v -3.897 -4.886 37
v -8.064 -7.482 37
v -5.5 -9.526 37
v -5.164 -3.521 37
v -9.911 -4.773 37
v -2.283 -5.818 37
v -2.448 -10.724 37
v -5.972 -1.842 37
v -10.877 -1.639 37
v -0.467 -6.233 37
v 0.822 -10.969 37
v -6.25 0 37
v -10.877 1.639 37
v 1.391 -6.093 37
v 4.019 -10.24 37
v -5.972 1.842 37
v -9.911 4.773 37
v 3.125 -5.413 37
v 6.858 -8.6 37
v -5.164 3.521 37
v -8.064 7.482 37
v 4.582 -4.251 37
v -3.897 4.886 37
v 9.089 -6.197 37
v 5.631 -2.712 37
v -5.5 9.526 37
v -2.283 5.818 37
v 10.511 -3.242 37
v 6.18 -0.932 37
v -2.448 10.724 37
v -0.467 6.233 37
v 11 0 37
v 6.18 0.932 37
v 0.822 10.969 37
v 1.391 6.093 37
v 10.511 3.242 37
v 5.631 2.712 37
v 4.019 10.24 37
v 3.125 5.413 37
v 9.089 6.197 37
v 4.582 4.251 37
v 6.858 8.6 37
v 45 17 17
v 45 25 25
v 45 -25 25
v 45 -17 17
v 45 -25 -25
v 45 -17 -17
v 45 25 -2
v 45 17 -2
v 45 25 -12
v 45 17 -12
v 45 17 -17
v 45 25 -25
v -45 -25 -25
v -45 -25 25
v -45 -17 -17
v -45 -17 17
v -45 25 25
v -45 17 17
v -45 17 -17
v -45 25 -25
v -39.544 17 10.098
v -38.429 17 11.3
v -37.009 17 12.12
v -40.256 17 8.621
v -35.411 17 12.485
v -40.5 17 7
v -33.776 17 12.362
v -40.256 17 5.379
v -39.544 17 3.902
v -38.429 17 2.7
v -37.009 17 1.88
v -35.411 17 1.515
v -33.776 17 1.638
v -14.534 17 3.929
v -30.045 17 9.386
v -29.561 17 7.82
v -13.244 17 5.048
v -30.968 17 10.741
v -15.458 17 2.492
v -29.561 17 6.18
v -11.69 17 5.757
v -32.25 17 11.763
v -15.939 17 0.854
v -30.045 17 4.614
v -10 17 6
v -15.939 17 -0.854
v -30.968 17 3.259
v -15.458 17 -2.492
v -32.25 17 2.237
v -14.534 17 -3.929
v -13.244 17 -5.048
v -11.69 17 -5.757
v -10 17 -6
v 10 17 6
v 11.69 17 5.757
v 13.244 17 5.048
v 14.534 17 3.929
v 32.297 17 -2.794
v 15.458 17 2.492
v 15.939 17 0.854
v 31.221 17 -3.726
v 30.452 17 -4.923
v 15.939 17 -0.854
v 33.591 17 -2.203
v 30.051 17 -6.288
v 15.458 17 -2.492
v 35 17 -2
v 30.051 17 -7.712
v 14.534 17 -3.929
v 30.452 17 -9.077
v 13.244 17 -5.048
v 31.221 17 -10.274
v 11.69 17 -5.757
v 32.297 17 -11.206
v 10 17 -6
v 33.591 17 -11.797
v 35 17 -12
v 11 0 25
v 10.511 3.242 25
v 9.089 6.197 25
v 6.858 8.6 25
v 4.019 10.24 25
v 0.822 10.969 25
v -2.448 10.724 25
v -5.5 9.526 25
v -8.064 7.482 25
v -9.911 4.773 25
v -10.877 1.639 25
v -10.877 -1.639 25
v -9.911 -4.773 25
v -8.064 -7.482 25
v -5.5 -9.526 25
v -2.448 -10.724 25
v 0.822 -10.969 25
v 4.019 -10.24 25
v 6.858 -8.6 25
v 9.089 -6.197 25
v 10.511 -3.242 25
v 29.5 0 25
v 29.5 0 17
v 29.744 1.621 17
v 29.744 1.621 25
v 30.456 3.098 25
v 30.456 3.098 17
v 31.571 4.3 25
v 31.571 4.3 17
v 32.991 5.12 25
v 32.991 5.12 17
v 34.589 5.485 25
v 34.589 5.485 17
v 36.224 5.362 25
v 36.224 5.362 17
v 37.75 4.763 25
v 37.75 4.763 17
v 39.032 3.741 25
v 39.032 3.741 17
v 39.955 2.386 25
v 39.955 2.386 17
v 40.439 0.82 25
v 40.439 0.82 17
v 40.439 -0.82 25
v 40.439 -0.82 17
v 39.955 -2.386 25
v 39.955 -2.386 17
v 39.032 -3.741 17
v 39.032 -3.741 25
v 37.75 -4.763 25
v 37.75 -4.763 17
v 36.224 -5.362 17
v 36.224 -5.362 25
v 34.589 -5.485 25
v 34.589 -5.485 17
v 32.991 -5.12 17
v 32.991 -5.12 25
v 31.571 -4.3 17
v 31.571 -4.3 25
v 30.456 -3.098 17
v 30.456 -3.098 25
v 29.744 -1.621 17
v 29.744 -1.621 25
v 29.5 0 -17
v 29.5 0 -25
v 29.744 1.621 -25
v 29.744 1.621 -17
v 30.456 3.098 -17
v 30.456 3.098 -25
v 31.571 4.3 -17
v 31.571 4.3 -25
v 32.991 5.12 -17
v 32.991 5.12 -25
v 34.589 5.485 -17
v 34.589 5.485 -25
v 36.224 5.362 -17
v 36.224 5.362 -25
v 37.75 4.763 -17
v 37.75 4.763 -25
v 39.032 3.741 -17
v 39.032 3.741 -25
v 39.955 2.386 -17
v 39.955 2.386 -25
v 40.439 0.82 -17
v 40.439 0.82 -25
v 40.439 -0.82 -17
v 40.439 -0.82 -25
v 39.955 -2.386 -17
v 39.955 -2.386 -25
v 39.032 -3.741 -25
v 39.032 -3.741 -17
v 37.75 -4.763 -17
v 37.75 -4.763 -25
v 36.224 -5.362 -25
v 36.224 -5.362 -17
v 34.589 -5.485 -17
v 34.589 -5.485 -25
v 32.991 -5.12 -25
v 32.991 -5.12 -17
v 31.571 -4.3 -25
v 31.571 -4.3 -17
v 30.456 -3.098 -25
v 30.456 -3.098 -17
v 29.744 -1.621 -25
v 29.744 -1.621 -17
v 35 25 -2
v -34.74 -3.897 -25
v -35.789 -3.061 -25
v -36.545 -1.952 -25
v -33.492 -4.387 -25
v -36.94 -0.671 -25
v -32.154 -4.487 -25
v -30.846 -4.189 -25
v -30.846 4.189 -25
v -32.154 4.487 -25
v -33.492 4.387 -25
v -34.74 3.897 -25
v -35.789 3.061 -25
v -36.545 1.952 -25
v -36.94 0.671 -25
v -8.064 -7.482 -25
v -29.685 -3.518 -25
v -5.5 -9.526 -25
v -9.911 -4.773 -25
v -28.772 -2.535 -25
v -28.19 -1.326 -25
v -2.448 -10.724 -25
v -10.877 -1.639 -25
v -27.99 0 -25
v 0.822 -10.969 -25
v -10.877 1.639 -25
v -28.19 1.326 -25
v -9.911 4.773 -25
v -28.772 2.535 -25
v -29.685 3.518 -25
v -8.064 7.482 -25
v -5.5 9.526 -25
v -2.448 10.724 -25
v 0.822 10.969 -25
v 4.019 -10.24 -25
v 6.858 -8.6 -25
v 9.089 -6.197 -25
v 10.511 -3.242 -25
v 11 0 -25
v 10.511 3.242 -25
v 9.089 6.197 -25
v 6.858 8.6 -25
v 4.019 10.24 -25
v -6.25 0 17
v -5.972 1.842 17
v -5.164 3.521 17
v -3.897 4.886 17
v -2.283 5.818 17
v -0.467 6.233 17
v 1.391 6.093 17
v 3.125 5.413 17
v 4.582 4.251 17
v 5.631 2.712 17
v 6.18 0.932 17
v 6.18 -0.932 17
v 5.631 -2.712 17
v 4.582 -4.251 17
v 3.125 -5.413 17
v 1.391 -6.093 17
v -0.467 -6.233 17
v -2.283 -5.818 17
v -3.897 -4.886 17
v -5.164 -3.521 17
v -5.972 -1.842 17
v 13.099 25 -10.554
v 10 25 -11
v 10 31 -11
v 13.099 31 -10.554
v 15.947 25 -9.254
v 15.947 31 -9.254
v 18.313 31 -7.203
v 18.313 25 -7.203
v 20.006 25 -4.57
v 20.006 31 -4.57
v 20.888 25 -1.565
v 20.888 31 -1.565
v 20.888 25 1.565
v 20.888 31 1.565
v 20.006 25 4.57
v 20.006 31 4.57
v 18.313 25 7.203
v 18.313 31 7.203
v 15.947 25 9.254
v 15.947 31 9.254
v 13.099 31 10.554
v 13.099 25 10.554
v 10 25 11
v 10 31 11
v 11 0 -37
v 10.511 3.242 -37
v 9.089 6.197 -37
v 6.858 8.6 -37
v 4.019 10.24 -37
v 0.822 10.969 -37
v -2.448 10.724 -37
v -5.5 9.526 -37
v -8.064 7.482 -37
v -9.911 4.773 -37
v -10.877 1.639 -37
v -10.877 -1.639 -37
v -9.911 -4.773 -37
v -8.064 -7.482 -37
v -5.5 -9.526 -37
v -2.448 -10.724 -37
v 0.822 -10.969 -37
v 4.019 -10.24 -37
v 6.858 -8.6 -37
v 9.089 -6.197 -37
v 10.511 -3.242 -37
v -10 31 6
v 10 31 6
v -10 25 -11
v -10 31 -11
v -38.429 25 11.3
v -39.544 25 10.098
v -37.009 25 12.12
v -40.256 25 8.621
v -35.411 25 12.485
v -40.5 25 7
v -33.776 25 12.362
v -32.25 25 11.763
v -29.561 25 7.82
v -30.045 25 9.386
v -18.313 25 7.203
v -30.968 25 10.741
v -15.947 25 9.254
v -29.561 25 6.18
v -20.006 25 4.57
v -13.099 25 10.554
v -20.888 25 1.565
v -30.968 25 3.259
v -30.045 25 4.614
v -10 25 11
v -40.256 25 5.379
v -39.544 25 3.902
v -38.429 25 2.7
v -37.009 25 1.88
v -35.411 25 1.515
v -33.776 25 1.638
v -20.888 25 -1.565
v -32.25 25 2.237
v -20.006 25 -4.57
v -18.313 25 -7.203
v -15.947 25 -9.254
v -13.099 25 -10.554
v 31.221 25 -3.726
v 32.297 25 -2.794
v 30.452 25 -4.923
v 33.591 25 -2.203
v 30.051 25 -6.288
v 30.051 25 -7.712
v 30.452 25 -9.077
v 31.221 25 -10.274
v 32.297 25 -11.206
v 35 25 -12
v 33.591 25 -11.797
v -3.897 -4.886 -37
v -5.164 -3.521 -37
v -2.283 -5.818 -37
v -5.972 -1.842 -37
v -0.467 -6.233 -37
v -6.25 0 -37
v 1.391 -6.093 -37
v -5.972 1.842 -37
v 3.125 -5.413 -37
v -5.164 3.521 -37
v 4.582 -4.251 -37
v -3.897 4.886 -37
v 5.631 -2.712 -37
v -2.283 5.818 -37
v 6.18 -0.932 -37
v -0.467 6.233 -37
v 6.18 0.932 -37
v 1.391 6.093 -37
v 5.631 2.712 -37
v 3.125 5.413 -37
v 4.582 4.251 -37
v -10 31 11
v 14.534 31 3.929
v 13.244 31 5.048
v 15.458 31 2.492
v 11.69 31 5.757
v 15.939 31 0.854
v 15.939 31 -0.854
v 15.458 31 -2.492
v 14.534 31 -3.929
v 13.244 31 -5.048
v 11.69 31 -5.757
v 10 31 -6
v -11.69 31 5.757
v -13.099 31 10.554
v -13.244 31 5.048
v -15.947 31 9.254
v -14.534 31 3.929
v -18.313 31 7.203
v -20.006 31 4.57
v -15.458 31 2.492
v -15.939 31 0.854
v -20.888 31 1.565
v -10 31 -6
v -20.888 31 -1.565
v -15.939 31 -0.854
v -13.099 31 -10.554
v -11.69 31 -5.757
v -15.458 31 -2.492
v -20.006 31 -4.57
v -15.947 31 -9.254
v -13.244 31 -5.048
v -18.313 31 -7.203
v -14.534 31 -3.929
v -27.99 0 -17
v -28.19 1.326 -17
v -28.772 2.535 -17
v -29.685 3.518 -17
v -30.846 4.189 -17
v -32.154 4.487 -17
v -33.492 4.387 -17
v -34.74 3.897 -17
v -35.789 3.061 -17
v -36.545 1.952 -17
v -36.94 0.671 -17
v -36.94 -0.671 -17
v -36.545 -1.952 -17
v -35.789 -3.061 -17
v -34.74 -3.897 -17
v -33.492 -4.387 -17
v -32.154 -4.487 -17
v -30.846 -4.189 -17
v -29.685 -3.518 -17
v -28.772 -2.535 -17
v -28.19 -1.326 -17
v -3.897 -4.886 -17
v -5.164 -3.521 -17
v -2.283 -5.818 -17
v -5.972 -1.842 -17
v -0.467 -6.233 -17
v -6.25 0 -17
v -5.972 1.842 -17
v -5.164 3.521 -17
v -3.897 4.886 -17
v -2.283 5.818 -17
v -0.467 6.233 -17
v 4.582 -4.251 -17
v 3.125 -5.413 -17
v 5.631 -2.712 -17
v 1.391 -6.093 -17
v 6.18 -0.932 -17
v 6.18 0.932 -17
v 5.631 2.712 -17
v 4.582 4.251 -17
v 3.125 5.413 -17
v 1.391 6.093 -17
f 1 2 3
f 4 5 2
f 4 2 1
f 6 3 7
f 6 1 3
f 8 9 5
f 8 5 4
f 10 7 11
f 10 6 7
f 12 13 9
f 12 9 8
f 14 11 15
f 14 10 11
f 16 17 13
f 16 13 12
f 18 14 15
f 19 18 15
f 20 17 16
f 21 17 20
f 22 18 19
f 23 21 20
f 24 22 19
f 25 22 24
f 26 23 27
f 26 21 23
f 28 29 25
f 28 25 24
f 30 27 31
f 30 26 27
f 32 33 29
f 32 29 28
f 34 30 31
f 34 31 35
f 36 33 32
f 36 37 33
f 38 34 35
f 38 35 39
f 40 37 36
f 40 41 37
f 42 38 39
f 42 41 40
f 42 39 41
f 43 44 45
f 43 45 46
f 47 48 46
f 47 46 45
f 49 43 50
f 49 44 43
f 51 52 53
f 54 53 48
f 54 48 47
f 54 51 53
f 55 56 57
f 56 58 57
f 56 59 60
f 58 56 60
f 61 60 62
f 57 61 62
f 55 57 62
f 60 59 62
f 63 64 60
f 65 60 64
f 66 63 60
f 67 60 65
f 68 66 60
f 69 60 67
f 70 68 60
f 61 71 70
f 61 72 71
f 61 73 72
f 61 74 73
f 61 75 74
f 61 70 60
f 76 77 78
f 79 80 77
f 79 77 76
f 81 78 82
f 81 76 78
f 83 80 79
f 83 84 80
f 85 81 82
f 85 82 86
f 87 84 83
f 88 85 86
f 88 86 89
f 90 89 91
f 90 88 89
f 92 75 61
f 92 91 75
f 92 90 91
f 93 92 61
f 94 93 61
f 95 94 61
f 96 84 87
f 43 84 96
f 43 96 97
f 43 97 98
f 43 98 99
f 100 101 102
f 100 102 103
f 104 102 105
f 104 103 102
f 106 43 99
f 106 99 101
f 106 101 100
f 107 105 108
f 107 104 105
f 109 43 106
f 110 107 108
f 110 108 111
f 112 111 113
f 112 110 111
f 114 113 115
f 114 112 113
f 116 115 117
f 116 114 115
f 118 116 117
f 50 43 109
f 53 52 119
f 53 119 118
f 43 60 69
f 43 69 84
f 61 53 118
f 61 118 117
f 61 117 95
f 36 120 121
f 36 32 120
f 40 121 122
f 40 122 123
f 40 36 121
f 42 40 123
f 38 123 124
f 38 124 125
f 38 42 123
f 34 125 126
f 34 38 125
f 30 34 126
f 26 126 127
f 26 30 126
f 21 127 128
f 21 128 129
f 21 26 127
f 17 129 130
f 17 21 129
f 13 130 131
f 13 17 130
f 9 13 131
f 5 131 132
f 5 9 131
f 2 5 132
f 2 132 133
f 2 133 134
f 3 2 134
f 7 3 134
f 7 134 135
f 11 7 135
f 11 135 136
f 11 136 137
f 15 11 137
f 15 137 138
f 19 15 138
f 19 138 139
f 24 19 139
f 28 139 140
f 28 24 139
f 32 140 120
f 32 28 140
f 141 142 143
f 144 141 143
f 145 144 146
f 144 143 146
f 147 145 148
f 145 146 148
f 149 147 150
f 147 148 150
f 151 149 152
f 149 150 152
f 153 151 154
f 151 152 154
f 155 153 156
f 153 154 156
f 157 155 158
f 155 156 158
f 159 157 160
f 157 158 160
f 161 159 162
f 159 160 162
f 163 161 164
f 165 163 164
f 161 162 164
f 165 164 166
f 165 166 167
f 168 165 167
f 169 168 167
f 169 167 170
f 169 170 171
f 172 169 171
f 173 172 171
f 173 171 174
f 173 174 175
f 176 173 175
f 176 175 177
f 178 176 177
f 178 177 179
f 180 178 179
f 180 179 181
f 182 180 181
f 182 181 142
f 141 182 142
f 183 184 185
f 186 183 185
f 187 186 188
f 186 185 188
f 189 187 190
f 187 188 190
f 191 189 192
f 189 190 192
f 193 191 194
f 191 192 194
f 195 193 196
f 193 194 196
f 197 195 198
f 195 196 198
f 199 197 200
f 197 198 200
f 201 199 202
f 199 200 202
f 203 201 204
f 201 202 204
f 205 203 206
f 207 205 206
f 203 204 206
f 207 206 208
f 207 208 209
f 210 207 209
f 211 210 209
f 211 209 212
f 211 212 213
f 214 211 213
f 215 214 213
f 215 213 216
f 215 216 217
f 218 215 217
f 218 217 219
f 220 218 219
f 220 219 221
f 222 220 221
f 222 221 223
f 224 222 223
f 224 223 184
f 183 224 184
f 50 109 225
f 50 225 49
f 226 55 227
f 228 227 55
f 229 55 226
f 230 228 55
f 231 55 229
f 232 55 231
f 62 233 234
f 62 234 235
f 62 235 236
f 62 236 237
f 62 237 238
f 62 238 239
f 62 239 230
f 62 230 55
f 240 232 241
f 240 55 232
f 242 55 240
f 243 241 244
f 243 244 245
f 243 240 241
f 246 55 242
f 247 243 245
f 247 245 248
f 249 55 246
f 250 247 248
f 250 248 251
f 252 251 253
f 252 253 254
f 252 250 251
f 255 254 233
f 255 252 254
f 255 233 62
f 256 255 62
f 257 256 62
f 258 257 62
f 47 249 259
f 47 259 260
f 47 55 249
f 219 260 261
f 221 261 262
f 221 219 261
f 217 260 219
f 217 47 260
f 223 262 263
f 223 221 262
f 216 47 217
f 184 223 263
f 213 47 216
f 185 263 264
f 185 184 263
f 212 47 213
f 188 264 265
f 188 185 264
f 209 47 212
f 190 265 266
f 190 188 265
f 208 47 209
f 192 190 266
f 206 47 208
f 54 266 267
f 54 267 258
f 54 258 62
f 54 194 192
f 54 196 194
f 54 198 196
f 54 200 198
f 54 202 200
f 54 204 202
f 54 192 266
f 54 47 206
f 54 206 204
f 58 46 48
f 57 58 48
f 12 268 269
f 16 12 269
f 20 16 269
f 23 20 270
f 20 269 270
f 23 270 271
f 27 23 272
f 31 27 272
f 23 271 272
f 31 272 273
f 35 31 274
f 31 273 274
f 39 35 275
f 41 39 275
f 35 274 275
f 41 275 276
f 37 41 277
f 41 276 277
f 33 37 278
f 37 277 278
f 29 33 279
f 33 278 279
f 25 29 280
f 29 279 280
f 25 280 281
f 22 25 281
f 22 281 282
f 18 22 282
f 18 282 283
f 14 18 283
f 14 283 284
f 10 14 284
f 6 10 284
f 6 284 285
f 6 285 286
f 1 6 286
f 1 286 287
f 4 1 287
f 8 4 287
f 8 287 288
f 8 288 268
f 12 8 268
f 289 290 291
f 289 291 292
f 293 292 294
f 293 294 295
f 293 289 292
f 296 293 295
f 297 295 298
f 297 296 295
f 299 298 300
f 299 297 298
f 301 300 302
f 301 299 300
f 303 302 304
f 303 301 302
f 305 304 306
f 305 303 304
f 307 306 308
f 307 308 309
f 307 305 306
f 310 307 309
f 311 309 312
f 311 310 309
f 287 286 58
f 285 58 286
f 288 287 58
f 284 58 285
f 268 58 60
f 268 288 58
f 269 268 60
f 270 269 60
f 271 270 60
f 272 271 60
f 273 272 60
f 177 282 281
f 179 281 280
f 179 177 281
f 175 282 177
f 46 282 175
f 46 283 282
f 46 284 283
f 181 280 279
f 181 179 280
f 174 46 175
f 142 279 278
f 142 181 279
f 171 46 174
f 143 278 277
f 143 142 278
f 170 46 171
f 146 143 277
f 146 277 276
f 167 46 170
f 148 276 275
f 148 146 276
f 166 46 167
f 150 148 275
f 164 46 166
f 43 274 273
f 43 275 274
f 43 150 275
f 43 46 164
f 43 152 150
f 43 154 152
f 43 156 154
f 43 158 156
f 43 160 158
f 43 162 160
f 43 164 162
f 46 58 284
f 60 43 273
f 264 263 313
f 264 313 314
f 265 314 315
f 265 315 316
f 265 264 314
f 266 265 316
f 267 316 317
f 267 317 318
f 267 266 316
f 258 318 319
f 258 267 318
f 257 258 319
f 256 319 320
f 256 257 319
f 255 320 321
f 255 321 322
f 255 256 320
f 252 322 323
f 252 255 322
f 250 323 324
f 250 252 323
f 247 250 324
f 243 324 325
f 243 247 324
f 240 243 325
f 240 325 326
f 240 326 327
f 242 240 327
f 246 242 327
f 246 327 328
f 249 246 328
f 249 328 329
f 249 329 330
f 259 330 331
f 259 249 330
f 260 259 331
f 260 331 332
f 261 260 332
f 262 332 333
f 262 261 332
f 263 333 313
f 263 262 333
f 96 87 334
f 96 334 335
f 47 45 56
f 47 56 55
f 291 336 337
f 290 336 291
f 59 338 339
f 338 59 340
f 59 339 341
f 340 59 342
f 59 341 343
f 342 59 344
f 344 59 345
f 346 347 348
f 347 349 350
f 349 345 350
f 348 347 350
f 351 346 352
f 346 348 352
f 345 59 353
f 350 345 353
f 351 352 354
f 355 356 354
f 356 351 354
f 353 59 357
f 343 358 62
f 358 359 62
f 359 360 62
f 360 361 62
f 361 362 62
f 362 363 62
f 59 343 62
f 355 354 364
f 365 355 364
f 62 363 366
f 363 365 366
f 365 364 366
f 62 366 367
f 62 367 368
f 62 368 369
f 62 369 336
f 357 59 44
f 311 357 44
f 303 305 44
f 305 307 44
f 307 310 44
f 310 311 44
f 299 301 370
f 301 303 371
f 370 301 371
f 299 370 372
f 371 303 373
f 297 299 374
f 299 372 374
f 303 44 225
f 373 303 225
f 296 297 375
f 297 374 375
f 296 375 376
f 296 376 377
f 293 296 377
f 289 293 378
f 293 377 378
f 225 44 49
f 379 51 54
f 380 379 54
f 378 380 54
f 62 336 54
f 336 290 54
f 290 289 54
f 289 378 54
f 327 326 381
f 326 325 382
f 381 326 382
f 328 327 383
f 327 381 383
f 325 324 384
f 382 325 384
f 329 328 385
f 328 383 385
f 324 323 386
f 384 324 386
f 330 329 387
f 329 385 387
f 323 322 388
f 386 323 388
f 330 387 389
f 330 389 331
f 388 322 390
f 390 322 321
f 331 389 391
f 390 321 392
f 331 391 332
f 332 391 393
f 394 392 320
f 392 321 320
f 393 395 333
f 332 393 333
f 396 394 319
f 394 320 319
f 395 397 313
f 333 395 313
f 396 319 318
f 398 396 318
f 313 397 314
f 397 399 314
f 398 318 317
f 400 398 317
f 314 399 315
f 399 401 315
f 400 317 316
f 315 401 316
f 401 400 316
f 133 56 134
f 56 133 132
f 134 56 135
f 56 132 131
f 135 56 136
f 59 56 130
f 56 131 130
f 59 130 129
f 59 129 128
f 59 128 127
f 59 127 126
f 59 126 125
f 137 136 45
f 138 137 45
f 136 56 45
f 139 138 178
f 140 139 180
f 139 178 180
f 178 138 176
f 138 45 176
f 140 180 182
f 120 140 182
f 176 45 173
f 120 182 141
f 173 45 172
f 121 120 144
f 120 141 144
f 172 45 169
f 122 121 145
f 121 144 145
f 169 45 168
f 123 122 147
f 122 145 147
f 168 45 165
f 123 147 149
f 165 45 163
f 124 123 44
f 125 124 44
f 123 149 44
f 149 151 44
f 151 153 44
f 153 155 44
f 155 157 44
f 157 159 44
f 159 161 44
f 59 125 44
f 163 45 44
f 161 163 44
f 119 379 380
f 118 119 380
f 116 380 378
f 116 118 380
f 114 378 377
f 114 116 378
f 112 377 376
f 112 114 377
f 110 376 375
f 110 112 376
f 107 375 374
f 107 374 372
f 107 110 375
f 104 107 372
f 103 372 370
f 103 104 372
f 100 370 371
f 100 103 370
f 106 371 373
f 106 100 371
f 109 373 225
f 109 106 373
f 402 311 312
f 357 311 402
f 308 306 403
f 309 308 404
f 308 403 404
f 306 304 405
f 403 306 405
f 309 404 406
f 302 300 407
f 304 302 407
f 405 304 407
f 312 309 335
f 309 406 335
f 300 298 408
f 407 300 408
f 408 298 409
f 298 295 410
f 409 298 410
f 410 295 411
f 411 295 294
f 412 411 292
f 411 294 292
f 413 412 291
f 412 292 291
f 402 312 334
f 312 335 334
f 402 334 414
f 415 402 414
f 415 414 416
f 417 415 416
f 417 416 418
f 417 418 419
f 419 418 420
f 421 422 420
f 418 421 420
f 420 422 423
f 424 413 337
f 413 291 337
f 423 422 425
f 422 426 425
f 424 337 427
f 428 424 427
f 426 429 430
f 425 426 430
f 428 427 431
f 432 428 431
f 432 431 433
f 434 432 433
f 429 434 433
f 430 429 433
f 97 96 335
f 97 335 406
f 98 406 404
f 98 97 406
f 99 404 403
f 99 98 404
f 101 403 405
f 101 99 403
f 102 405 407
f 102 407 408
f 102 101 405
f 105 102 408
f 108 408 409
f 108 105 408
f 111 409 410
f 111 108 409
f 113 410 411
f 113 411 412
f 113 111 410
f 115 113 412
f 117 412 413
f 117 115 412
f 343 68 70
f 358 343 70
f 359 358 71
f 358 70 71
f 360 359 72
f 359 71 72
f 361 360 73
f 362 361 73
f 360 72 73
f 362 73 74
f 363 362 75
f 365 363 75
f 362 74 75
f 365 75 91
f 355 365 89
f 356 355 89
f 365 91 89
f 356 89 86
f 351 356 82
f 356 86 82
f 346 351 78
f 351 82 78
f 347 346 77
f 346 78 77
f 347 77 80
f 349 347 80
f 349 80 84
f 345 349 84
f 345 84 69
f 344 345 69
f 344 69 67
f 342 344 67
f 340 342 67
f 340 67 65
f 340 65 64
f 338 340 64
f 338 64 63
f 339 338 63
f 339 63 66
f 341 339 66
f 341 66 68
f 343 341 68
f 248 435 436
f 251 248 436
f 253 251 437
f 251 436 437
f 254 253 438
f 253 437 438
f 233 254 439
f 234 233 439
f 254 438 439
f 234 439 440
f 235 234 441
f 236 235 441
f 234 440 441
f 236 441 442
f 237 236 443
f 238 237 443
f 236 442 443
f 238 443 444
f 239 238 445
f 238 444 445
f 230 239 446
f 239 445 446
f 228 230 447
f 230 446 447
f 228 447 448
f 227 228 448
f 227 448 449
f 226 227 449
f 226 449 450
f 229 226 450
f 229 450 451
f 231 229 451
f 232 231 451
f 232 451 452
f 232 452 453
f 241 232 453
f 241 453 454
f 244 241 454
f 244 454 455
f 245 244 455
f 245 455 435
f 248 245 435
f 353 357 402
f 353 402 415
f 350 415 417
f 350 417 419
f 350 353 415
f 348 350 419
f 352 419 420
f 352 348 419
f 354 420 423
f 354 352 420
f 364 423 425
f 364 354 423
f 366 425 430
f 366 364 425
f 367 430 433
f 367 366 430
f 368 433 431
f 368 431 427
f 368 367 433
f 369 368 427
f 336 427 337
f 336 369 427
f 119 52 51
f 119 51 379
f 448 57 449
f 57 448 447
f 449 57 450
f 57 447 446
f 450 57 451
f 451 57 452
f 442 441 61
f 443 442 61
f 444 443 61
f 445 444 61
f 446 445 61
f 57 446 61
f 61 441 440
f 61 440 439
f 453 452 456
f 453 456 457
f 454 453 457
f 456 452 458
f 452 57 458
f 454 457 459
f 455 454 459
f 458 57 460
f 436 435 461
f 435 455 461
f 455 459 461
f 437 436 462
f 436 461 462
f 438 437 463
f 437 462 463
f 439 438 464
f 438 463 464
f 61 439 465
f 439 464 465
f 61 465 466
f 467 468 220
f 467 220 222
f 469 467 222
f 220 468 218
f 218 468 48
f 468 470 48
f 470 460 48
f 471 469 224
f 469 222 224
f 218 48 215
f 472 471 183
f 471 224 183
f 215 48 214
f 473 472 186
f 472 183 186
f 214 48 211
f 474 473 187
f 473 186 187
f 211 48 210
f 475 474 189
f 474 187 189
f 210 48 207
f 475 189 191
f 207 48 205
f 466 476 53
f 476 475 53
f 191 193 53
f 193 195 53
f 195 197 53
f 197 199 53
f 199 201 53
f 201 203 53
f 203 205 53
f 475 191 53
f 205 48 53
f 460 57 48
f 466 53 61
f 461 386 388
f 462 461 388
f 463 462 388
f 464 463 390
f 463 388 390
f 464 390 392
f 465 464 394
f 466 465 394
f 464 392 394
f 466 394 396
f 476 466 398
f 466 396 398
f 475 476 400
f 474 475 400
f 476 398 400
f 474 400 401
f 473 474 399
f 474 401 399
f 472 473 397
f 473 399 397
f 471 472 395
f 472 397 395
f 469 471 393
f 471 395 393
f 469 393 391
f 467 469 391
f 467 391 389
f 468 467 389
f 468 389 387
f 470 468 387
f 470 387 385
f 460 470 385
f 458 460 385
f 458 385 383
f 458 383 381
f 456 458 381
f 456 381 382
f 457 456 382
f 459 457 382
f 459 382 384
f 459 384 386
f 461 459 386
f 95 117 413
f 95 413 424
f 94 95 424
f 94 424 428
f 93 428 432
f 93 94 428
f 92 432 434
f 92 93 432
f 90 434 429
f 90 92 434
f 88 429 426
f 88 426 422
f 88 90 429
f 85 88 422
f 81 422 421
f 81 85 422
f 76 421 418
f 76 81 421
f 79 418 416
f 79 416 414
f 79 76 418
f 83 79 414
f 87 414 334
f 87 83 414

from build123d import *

# Parameters (mm, degrees)
SKETCH1_W                      = 50
SKETCH1_H                      = 50
BOSS_EXTRUDE1_DEPTH            = 45
SKETCH3_R                      = 11
BOSS_EXTRUDE2_DEPTH            = 37
BOSS_EXTRUDE3_DEPTH            = 6
SKETCH5_W                      = 34
SKETCH5_H                      = 34
CUT_EXTRUDE1_DEPTH             = 103.127371453
F_12_5_12_5_DIAMETER_HOLE1_D   = 12.5
F_12_0_START                   = 17
F_12_0_12_DIAMETER_SLOT2_DEPTH = 14
F_10_0_START                   = 17
F_10_0_10_DIAMETER_SLOT1_DEPTH = 8
M10_CLEARANCE_HOLE1_D          = 11
M10_CLEARANCE_HOLE1_DEPTH      = 8
M10_CLEARANCE_HOLE2_D          = 11
M10X1_0_TAPPED_HOLE1_D         = 9
M10X1_0_TAPPED_HOLE1_DEPTH     = 8


# Read off the part's stored shape, not the designer's step: Ø12.0 (12) Diameter Slot2, Ø10.0 (10) Diameter Slot1
with BuildPart() as part:
    # Sketch1 → Boss-Extrude1 (new, symmetric)
    with BuildSketch(Plane(origin=(0, 0, 0), x_dir=(0, 0, -1), z_dir=(1, 0, 0))):
        Rectangle(SKETCH1_W, SKETCH1_H)
    extrude(amount=BOSS_EXTRUDE1_DEPTH, both=True)

    # Sketch3 → Boss-Extrude2 (add, symmetric)
    with BuildSketch(Plane.XY):
        Circle(SKETCH3_R)
    extrude(amount=BOSS_EXTRUDE2_DEPTH, both=True)

    # Sketch4 → Boss-Extrude3 (add)
    with BuildSketch(Plane(origin=(0, 25, 0), x_dir=(1, 0, 0), z_dir=(0, 1, 0))):
        with BuildLine():
            Line((-10, 11), (10, 11))
            ThreePointArc((10, 11), (21, 0), (10, -11))
            Line((10, -11), (-10, -11))
            ThreePointArc((-10, -11), (-21, 0), (-10, 11))
        make_face()
    extrude(amount=BOSS_EXTRUDE3_DEPTH)

    # Sketch5 → Cut-Extrude1 (cut, through all)
    with BuildSketch(Plane(origin=(45, 0, 0), x_dir=(0, 0, -1), z_dir=(1, 0, 0))):
        Rectangle(SKETCH5_W, SKETCH5_H)
    extrude(amount=-CUT_EXTRUDE1_DEPTH, mode=Mode.SUBTRACT)

    # Ø12.5 (12.5) Diameter Hole1 (through all)
    with Locations(Plane.XY.offset(37)):
        with Locations((0, 0)):
            Hole(F_12_5_12_5_DIAMETER_HOLE1_D / 2)

    # Ø12.0 (12) Diameter Slot2 outline → Ø12.0 (12) Diameter Slot2 (cut)
    with BuildSketch(Plane(origin=(0, 0, 0), x_dir=(1, 0, 0), z_dir=(0, 1, 0)).offset(F_12_0_START)):
        with BuildLine():
            Line((-10, -6), (10, -6))
            ThreePointArc((10, -6), (16, 0), (10, 6))
            Line((10, 6), (-10, 6))
            ThreePointArc((-10, 6), (-16, 0), (-10, -6))
        make_face()
    extrude(amount=F_12_0_12_DIAMETER_SLOT2_DEPTH, mode=Mode.SUBTRACT)

    # Ø10.0 (10) Diameter Slot1 outline → Ø10.0 (10) Diameter Slot1 (cut)
    with BuildSketch(Plane(origin=(0, 0, 0), x_dir=(1, 0, 0), z_dir=(0, 1, 0)).offset(F_10_0_START)):
        with BuildLine():
            ThreePointArc((35, 12), (30, 7), (35, 2))
            Line((35, 2), (45, 2))
            Line((45, 2), (45, 12))
            Line((45, 12), (35, 12))
        make_face()
    extrude(amount=F_10_0_10_DIAMETER_SLOT1_DEPTH, mode=Mode.SUBTRACT)

    # M10 Clearance Hole1
    with Locations(Plane(origin=(0, 25, 0), x_dir=(1, 0, 0), z_dir=(0, 1, 0))):
        with Locations((-35, -7)):
            Hole(M10_CLEARANCE_HOLE1_D / 2, depth=M10_CLEARANCE_HOLE1_DEPTH)

    # M10 Clearance Hole2 (through all)
    with Locations(Plane(origin=(35, 0, 25), x_dir=(1, 0, 0), z_dir=(0, 0, 1))):
        with Locations((0, 0)):
            Hole(M10_CLEARANCE_HOLE2_D / 2)

    # M10x1.0 Tapped Hole1
    with Locations(Plane(origin=(0, 0, -25), x_dir=(-1, 0, 0), z_dir=(0, 0, -1))):
        with Locations((32.490263529, 0)):
            Hole(M10X1_0_TAPPED_HOLE1_D / 2, depth=M10X1_0_TAPPED_HOLE1_DEPTH)


solid = part.part
